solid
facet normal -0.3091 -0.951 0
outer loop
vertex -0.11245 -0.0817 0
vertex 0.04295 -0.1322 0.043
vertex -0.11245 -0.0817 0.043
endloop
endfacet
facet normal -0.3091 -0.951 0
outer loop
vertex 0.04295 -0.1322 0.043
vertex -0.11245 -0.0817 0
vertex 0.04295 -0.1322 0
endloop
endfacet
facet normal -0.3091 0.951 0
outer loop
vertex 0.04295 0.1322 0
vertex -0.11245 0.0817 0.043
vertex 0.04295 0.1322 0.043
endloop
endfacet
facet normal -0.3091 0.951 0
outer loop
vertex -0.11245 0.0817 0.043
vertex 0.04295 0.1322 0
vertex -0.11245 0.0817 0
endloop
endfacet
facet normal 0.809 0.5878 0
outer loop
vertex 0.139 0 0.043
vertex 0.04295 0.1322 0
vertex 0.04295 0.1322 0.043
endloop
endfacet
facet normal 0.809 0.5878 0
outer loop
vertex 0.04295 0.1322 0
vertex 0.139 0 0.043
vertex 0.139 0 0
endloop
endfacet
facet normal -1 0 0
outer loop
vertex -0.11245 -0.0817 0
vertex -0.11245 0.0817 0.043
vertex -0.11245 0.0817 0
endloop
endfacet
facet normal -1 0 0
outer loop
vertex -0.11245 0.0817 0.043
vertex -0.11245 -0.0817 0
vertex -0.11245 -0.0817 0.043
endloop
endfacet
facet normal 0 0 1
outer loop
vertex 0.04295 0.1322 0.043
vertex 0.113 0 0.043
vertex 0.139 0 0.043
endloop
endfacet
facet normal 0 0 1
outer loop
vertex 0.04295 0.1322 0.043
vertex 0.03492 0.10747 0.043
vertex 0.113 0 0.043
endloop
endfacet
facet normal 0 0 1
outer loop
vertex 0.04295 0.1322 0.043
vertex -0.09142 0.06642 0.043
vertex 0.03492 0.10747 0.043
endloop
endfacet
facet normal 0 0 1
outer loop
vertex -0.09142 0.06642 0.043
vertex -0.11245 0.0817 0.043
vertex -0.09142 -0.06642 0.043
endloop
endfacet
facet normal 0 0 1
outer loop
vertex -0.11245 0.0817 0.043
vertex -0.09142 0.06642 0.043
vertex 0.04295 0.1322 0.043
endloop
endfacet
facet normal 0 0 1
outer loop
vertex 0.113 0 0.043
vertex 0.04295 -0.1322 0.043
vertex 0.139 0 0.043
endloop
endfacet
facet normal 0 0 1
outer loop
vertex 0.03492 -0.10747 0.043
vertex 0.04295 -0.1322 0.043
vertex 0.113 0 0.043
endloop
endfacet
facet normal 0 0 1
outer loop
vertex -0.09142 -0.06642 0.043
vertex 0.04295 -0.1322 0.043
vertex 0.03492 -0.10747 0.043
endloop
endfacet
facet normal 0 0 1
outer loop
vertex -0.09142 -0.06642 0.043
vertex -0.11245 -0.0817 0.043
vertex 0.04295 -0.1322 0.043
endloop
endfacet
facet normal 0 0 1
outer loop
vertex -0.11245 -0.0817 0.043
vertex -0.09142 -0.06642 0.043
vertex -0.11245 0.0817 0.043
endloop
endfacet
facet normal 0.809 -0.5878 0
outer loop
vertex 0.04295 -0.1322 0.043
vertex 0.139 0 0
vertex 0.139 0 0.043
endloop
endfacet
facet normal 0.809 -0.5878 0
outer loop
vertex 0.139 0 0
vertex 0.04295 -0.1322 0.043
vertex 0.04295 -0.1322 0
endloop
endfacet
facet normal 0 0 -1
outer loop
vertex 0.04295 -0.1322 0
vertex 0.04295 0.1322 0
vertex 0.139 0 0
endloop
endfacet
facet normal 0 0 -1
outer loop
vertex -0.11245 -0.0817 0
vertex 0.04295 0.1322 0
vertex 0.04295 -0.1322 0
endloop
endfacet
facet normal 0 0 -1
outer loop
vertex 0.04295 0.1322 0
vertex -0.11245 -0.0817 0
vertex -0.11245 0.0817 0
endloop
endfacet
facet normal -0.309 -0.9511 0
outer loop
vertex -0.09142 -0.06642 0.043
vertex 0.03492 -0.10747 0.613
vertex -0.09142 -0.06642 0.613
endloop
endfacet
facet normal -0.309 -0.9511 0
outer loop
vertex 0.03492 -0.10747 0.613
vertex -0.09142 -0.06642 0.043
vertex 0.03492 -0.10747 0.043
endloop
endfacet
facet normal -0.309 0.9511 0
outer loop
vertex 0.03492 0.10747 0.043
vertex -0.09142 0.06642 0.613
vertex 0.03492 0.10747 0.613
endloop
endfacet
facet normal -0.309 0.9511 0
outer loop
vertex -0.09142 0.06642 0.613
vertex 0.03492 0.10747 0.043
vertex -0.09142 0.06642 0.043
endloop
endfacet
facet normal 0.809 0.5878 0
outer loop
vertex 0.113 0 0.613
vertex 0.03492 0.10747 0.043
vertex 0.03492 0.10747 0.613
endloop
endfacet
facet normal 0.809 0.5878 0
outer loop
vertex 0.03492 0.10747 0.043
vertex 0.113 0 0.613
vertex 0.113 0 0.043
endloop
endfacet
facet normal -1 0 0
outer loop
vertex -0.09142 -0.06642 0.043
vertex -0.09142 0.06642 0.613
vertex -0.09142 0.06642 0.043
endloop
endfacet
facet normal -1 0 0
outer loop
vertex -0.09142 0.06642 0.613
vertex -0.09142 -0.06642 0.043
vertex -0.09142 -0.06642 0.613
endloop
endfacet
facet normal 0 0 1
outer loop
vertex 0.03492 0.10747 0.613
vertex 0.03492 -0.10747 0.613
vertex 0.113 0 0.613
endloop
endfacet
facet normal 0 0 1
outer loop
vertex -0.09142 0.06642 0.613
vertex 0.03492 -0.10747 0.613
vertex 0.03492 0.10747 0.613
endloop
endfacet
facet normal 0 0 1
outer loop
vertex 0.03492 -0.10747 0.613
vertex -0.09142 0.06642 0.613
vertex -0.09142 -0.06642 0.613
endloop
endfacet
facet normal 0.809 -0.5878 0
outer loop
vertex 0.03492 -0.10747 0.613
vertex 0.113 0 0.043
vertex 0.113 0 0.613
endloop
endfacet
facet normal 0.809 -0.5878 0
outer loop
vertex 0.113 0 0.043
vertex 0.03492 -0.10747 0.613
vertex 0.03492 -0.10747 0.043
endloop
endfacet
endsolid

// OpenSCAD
/* .22 LR Cartridge (Sporting)
 * Source: https://saami.org/wp-content/uploads/2019/06/ANSI-SAAMI-Z299.1-Rimfire-2015-R2018-Approved-2018-06-13.pdf
 * 
 * Units are INCHES unless otherwise stated
 *
 * This object not working. Probably did not actually ever finish it. 
 */
$fa = 1;	// min. angle of fragment, degrees
$fs = 1;	// min. size of fragment, inch

casing_22_LR();

/*================================*/
/*       Module Definitions       */
/*================================*/
module casing_22_LR(){
	/* Inches Units */
	t_rim = 0.043;
	r_rim = 0.278/2;
	r_casing = 0.226/2;
	r_bullet = 0.2255/2;
	length_casing = 0.613 - t_rim;
	length_max = 1.0; // maximum overall loaded length
	length_bullet = length_max - length_casing;

	// .22 LR Casing -- Exterior only
	cylinder(h=t_rim, r1=r_rim, r2=r_rim);
	translate([0,0,t_rim]){
		cylinder(h=length_casing, r1=r_casing, r2=r_casing);
	};

	// .22 LR Bullet -- Exterior only
	// TODO
};
